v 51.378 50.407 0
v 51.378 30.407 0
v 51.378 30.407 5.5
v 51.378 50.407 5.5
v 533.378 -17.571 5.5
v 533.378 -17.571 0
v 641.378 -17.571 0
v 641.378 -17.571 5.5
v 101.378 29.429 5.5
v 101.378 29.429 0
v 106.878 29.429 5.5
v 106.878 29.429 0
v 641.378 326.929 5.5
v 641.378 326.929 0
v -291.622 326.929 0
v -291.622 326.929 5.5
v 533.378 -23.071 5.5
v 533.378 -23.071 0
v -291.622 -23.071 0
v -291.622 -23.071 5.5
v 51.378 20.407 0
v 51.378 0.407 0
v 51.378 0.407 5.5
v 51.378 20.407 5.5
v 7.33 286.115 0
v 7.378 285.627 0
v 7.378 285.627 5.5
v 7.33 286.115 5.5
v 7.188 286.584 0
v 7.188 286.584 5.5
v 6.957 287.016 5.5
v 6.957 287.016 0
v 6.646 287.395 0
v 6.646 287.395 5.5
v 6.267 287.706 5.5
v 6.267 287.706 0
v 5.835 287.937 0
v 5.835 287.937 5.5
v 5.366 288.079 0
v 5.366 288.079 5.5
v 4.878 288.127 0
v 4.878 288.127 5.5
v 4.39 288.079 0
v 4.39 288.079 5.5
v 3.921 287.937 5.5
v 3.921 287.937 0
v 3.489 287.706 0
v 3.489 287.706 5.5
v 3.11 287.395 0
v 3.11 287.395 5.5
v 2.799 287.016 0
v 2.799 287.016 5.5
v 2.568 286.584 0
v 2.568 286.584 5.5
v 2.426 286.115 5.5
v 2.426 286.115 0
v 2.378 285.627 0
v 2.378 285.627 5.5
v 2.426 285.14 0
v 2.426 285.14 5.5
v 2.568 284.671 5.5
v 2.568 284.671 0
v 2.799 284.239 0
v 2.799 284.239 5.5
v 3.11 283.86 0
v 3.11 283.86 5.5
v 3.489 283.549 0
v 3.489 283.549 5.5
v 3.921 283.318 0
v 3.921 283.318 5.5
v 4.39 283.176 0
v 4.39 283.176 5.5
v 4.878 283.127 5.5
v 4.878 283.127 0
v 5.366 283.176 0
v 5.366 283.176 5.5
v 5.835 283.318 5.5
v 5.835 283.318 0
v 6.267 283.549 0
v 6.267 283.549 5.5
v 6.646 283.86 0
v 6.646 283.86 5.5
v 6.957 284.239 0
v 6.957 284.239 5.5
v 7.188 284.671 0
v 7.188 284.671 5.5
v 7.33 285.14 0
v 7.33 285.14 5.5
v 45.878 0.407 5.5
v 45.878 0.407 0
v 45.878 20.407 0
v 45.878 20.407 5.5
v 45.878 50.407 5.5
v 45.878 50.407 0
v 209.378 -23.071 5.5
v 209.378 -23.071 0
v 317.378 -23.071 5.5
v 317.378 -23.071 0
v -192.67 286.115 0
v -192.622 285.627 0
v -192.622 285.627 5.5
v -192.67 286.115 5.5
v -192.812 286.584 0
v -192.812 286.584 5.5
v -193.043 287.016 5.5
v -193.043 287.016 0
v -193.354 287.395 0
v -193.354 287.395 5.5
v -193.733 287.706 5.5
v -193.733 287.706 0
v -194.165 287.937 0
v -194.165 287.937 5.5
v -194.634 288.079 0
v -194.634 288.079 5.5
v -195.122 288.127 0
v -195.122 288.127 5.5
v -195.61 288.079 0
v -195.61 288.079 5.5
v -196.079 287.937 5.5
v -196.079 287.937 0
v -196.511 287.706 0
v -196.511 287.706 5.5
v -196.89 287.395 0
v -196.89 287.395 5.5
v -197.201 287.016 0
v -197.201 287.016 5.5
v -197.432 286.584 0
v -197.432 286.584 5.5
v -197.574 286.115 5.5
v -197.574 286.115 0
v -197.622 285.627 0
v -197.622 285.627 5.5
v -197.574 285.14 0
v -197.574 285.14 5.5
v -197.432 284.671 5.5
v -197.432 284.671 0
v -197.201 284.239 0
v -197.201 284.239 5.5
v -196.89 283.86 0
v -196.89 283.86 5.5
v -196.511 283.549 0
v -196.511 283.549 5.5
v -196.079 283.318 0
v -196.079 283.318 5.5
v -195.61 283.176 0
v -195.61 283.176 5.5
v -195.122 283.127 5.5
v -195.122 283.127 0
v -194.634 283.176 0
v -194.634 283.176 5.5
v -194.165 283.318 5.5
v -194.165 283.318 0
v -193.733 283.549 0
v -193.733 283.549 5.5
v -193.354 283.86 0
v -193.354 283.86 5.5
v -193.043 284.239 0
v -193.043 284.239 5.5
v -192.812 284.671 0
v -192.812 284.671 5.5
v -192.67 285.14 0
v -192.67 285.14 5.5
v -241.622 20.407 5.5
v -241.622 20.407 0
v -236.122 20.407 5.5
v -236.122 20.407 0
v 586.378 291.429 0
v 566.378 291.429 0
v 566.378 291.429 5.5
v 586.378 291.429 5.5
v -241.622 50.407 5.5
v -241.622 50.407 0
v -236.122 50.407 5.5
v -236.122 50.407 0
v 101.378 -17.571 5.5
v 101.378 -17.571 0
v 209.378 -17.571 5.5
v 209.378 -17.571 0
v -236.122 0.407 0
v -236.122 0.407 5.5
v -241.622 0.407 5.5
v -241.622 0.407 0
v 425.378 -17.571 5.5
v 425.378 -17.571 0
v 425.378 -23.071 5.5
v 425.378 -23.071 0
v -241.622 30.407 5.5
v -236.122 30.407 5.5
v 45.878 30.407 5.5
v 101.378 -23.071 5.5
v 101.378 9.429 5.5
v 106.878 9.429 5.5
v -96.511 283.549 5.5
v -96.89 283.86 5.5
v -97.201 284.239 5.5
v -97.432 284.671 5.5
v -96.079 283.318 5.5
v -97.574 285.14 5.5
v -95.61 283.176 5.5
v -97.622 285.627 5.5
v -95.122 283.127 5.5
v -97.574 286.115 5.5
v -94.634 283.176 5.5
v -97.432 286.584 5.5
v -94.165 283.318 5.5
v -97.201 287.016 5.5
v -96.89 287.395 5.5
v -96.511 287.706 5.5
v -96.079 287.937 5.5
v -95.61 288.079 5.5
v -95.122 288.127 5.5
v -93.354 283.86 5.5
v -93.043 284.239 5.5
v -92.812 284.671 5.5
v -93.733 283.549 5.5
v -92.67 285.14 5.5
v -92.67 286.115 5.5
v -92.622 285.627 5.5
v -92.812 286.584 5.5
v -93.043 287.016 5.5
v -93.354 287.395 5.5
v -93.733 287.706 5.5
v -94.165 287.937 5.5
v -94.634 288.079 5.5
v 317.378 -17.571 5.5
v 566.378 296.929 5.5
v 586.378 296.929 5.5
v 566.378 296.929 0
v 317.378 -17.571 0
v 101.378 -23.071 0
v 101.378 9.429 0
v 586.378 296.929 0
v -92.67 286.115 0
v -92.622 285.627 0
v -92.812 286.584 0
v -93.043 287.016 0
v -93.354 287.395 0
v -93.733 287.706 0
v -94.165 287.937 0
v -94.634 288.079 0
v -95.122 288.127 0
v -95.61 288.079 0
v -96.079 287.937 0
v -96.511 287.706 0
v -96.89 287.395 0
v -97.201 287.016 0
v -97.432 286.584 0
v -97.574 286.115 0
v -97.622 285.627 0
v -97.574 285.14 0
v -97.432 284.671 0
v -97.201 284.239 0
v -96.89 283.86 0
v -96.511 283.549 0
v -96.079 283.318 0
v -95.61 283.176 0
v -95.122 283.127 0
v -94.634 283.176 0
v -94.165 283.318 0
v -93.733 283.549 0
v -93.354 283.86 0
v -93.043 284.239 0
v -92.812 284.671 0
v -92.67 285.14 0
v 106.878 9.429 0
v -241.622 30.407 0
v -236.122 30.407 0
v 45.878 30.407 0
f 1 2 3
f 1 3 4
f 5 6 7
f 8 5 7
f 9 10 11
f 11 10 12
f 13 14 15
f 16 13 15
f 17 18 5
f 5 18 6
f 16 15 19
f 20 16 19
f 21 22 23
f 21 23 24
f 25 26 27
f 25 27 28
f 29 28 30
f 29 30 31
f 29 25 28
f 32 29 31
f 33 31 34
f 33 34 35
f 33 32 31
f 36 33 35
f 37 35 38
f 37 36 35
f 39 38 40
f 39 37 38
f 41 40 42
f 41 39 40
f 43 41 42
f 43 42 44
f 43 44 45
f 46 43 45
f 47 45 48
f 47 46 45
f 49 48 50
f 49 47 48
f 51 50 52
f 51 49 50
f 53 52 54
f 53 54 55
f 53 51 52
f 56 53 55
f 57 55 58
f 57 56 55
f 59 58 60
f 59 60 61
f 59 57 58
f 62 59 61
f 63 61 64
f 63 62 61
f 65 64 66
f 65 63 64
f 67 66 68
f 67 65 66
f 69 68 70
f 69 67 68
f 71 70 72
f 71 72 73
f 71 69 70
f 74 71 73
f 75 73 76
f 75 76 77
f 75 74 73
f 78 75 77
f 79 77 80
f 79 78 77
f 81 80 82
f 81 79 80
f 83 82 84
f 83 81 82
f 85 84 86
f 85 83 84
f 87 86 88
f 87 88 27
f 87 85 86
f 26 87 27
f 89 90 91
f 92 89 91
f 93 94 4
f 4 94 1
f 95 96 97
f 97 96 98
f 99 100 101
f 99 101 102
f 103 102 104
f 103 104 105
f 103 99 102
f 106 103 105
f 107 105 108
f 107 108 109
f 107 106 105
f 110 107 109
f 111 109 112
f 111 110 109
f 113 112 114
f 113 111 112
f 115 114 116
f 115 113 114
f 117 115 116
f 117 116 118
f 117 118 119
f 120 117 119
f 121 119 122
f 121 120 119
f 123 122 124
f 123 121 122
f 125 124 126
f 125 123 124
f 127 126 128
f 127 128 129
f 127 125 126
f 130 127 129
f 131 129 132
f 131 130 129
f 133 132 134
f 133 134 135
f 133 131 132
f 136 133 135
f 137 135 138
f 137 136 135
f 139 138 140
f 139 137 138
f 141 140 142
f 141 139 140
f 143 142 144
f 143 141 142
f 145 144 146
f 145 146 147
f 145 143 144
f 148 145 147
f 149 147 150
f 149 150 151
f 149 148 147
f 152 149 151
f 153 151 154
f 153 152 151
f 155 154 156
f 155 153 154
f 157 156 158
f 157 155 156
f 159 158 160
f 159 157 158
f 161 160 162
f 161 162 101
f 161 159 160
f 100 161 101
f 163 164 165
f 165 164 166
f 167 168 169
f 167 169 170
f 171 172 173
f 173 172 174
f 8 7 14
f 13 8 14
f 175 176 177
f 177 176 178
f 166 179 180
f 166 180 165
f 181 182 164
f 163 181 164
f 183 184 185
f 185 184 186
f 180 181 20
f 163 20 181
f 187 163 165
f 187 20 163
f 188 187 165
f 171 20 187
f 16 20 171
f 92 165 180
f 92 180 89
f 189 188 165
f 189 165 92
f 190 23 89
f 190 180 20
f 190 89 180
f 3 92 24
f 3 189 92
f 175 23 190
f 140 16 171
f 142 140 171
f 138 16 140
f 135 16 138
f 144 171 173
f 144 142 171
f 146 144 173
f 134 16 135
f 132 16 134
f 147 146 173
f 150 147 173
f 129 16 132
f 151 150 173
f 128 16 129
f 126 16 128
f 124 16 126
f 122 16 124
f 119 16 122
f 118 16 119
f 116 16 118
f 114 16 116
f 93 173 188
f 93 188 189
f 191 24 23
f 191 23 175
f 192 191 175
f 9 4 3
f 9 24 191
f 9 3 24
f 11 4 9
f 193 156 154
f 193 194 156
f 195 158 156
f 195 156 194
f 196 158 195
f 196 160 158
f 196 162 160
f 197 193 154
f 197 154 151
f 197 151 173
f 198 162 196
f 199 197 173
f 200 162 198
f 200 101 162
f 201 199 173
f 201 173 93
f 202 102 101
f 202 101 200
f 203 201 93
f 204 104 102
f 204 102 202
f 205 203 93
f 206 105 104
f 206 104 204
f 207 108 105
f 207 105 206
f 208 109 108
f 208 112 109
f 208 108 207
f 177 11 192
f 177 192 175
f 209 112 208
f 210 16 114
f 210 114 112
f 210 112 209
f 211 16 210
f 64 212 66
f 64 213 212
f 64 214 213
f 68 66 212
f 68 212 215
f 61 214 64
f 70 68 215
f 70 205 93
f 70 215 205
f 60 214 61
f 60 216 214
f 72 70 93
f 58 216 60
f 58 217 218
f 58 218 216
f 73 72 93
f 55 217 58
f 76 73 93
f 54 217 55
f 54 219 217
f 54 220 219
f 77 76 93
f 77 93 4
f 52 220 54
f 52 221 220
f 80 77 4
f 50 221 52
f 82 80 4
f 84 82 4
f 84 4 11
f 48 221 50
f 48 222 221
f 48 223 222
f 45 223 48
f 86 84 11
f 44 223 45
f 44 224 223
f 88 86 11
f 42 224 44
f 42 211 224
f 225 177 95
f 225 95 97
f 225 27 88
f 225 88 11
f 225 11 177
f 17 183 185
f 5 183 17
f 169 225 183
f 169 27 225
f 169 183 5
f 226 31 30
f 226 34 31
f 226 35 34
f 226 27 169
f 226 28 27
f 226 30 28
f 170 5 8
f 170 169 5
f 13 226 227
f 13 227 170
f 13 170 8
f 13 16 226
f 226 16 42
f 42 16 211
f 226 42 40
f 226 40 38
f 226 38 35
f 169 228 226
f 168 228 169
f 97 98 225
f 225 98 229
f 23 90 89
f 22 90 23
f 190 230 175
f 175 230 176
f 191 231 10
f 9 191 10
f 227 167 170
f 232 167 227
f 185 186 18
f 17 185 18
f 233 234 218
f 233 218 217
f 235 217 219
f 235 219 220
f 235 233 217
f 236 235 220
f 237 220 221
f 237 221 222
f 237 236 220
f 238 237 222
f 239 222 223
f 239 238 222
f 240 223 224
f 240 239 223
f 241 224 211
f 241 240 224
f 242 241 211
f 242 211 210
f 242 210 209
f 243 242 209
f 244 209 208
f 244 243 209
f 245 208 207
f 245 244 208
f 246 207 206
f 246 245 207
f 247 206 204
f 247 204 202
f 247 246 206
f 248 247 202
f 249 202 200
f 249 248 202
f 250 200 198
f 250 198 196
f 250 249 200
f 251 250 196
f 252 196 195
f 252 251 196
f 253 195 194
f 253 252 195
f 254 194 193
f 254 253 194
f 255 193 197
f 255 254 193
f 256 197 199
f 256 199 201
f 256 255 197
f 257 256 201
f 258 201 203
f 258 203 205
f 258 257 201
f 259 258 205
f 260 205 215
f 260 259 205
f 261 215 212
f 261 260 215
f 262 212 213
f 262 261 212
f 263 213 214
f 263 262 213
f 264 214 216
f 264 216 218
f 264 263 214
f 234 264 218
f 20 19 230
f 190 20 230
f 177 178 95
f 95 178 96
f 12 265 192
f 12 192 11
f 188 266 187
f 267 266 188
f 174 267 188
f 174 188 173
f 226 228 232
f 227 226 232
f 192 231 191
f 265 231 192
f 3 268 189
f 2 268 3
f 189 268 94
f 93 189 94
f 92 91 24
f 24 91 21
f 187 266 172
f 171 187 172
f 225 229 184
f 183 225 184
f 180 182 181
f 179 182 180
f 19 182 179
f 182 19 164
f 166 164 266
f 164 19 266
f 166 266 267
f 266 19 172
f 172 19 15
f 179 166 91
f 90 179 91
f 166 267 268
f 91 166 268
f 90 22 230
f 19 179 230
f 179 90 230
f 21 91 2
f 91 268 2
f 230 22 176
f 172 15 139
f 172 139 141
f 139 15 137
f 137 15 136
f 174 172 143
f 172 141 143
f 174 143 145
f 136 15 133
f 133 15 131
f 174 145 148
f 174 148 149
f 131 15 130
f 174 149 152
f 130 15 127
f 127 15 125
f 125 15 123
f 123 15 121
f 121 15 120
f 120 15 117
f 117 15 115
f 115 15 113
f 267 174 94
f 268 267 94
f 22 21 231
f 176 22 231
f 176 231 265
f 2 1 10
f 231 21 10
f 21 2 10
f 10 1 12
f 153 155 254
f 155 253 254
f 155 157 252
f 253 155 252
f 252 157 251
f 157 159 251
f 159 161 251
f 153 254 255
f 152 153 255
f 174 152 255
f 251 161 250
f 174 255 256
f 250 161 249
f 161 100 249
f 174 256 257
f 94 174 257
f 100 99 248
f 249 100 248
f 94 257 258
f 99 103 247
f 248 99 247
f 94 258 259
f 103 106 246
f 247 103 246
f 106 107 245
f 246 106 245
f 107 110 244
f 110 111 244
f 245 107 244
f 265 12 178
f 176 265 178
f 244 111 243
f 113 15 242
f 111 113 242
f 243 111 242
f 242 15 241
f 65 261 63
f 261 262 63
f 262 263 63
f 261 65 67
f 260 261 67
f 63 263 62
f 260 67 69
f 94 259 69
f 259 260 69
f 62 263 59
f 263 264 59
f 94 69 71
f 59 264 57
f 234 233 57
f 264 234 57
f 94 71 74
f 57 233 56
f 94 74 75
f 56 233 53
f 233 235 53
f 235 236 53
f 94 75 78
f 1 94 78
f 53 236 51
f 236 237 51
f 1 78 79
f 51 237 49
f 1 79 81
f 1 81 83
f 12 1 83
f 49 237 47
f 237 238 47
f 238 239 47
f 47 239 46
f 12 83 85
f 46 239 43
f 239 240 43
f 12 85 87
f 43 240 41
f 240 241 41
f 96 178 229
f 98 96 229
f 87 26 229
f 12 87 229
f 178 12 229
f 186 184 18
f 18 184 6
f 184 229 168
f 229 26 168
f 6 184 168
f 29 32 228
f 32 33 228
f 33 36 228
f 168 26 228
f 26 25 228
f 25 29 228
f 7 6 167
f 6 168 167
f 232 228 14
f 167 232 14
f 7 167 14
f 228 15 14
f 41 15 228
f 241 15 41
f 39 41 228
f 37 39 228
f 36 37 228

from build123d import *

# Parameters (mm, degrees)
CROQUIS1_R              = 2.5
CROQUIS1_W              = 5.5
CROQUIS1_H              = 20
SALIENTE_EXTRUIR2_DEPTH = 5.5


with BuildPart() as part:
    # Croquis1 → Saliente-Extruir2 (new body)
    with BuildSketch(Plane.XY):
        Polygon((-291.621999317, -23.071413697), (101.378000683, -23.071413697), (101.378000683, -17.571413697), (209.378000683, -17.571413697), (209.378000683, -23.071413697), (317.378000683, -23.071413697), (317.378000683, -17.571413697), (425.378000683, -17.571413697), (425.378000683, -23.071413697), (533.378000683, -23.071413697), (533.378000683, -17.571413697), (641.378000683, -17.571413697), (641.378000683, 326.928586303), (-291.621999317, 326.928586303), align=None)
        with Locations((-195.121999317, 285.627487196)):
            Circle(CROQUIS1_R, mode=Mode.SUBTRACT)
        with Locations((-95.121999317, 285.627487196)):
            Circle(CROQUIS1_R, mode=Mode.SUBTRACT)
        with Locations((4.878000683, 285.627487196)):
            Circle(CROQUIS1_R, mode=Mode.SUBTRACT)
        with Locations((-238.871999317, 10.407487196)):
            Rectangle(CROQUIS1_W, CROQUIS1_H, mode=Mode.SUBTRACT)
        with Locations((48.628000683, 10.407487196)):
            Rectangle(CROQUIS1_W, CROQUIS1_H, mode=Mode.SUBTRACT)
        with Locations((-238.871999317, 40.407487196)):
            Rectangle(CROQUIS1_W, CROQUIS1_H, mode=Mode.SUBTRACT)
        with Locations((48.628000683, 40.407487196)):
            Rectangle(CROQUIS1_W, CROQUIS1_H, mode=Mode.SUBTRACT)
        Polygon((576.378000683, 296.928586303), (566.378000683, 296.928586303), (566.378000683, 291.428586303), (586.378000683, 291.428586303), (586.378000683, 296.928586303), align=None, mode=Mode.SUBTRACT)
        with Locations((104.128000683, 19.428586303)):
            Rectangle(CROQUIS1_W, CROQUIS1_H, mode=Mode.SUBTRACT)
    extrude(amount=SALIENTE_EXTRUIR2_DEPTH)


solid = part.part
